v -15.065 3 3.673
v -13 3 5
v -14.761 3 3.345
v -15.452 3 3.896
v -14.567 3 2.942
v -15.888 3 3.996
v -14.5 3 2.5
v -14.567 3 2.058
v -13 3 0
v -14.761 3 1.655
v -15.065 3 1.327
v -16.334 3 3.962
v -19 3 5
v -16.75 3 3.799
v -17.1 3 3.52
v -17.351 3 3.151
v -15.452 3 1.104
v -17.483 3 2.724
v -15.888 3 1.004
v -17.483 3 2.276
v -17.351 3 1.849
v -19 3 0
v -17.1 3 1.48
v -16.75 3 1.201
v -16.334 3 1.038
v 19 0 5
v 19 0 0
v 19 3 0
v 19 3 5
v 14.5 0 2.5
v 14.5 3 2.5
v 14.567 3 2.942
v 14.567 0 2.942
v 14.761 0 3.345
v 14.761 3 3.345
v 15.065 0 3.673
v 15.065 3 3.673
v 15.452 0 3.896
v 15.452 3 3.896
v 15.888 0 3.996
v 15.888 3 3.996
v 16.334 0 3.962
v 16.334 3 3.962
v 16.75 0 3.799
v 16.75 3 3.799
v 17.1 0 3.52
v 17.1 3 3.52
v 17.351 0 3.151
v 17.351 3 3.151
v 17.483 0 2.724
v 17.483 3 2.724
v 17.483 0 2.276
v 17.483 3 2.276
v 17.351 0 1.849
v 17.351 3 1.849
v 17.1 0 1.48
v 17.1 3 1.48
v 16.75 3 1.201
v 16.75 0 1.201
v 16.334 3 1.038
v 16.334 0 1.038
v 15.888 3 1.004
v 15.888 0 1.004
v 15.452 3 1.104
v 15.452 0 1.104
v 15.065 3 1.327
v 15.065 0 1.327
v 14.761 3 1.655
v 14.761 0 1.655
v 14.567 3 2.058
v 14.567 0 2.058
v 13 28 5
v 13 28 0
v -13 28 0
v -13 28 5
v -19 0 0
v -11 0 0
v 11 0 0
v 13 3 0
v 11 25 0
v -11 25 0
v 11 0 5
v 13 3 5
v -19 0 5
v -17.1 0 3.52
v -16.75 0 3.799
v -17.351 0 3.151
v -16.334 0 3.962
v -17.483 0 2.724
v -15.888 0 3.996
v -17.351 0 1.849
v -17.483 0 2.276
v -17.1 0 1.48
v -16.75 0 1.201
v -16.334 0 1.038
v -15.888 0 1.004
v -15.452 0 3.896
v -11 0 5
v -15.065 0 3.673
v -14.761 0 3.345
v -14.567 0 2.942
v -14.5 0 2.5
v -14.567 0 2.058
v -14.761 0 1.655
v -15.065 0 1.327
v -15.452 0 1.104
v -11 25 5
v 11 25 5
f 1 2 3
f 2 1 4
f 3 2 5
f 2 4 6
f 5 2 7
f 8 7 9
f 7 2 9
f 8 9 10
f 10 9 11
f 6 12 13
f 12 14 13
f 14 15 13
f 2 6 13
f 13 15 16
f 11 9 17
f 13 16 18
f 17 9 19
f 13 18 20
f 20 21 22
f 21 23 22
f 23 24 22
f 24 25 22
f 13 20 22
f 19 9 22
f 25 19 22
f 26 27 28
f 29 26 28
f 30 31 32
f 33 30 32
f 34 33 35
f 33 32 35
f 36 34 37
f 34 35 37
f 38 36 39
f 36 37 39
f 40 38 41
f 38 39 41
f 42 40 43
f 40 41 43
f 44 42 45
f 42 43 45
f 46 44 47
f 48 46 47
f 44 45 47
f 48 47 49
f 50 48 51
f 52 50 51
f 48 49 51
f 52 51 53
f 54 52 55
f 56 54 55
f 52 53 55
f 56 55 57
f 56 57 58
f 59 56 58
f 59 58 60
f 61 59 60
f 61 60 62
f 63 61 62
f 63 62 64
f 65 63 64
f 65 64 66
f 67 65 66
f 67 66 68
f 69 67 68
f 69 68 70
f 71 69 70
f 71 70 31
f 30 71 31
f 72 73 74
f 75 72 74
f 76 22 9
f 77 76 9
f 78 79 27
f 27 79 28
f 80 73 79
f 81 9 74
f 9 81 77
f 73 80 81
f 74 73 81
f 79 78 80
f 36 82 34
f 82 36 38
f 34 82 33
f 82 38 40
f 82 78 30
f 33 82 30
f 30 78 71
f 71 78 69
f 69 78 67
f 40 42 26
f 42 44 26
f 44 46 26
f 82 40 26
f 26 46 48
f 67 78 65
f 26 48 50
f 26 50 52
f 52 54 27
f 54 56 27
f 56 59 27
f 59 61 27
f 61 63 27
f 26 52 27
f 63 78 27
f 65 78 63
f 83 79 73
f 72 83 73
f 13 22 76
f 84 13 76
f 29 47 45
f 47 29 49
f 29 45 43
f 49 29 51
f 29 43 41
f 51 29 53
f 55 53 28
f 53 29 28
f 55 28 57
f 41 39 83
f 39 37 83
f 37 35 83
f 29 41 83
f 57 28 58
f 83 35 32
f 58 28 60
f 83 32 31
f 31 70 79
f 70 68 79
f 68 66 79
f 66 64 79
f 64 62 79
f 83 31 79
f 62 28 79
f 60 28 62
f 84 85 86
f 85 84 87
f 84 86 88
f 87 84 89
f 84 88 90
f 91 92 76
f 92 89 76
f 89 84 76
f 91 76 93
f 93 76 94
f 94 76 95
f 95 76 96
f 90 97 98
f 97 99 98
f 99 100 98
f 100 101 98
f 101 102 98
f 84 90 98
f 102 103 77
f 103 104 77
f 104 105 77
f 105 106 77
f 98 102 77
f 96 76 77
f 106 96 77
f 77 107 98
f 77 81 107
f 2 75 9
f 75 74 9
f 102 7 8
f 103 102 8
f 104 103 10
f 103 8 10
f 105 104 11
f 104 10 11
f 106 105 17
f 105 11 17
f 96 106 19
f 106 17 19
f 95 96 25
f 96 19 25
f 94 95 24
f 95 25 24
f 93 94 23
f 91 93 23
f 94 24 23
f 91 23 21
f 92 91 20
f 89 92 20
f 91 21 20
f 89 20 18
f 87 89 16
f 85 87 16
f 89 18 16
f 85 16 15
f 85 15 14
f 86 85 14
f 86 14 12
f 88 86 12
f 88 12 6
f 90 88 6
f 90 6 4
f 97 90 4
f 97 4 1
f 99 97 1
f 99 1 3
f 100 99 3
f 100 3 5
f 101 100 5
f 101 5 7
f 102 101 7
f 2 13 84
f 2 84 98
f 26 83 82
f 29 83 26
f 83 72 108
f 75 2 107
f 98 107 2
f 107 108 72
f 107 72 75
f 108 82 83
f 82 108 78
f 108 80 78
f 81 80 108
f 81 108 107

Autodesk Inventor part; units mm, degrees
ref_plane "YZ Plane" through (0, 0, 0) normal (1, 0, 0) x (0, 1, 0)
ref_plane "XZ Plane" through (0, 0, 0) normal (0, 1, 0) x (-1, 0, 0)
ref_plane "XY Plane" through (0, 0, 0) normal (0, 0, 1) x (1, 0, 0)
sketch "Sketch1" plane through (0, 0, 0) normal (0, 0, 1) x (1, 0, 0)
  line L0 (-10, 25) -> (10, 25)
  line L1 (13, 28) -> (-13, 28)
  line L2 (-13, 28) -> (-13, 3)
  line L3 (13, 3) -> (13, 28)
  line L4 (11, 0) -> (17, 0)
  line L5 (17, 3) -> (13, 3)
  line L6 (-13, 3) -> (-17, 3)
  line L7 (-17, 0) -> (-11, 0)
  line L8 (-17, 3) -> (-19, 3)
  line L9 (-19, 3) -> (-19, 0)
  line L10 (-19, 0) -> (-17, 0)
  line L11 (17, 0) -> (19, 0)
  line L12 (19, 0) -> (19, 3)
  line L13 (17, 3) -> (19, 3)
  line L14 (-10, 25) -> (-11, 25)
  line L15 (-11, 25) -> (-11, 0)
  line L16 (10, 25) -> (11, 25)
  line L17 (11, 25) -> (11, 0)
  point P0 (0, 0)
  dimension "d0" = 20
  dimension "d2" = 3
  dimension "d12" = 3
  dimension "d17" = 1
extrude "Extrusion1" add sketch "Sketch1" along normal blind 5
sketch "Sketch2" plane through (-19, 3, 0) normal (0, 1, 0) x (1, 0, 0)
  circle A0 centre (3, -2.5) radius 1.5
  point P0 (19, 0)
  dimension "d13" = 3
extrude "Extrusion2" cut sketch "Sketch2" against normal up to next
sketch "Sketch3" plane through (-13, 28, 0) normal (0, 1, 0) x (1, 0, 0)
  point P0 (13, 0)
mirror "Mirror1" about plane through (0, 0, 0) normal (1, 0, 0) of "Extrusion2"
sketch "Sketch4" plane through (-19, 0, 0) normal (0, -1, 0) x (1, 0, 0)
  point P0 (19, 0)
properties part number "servo shaft"
